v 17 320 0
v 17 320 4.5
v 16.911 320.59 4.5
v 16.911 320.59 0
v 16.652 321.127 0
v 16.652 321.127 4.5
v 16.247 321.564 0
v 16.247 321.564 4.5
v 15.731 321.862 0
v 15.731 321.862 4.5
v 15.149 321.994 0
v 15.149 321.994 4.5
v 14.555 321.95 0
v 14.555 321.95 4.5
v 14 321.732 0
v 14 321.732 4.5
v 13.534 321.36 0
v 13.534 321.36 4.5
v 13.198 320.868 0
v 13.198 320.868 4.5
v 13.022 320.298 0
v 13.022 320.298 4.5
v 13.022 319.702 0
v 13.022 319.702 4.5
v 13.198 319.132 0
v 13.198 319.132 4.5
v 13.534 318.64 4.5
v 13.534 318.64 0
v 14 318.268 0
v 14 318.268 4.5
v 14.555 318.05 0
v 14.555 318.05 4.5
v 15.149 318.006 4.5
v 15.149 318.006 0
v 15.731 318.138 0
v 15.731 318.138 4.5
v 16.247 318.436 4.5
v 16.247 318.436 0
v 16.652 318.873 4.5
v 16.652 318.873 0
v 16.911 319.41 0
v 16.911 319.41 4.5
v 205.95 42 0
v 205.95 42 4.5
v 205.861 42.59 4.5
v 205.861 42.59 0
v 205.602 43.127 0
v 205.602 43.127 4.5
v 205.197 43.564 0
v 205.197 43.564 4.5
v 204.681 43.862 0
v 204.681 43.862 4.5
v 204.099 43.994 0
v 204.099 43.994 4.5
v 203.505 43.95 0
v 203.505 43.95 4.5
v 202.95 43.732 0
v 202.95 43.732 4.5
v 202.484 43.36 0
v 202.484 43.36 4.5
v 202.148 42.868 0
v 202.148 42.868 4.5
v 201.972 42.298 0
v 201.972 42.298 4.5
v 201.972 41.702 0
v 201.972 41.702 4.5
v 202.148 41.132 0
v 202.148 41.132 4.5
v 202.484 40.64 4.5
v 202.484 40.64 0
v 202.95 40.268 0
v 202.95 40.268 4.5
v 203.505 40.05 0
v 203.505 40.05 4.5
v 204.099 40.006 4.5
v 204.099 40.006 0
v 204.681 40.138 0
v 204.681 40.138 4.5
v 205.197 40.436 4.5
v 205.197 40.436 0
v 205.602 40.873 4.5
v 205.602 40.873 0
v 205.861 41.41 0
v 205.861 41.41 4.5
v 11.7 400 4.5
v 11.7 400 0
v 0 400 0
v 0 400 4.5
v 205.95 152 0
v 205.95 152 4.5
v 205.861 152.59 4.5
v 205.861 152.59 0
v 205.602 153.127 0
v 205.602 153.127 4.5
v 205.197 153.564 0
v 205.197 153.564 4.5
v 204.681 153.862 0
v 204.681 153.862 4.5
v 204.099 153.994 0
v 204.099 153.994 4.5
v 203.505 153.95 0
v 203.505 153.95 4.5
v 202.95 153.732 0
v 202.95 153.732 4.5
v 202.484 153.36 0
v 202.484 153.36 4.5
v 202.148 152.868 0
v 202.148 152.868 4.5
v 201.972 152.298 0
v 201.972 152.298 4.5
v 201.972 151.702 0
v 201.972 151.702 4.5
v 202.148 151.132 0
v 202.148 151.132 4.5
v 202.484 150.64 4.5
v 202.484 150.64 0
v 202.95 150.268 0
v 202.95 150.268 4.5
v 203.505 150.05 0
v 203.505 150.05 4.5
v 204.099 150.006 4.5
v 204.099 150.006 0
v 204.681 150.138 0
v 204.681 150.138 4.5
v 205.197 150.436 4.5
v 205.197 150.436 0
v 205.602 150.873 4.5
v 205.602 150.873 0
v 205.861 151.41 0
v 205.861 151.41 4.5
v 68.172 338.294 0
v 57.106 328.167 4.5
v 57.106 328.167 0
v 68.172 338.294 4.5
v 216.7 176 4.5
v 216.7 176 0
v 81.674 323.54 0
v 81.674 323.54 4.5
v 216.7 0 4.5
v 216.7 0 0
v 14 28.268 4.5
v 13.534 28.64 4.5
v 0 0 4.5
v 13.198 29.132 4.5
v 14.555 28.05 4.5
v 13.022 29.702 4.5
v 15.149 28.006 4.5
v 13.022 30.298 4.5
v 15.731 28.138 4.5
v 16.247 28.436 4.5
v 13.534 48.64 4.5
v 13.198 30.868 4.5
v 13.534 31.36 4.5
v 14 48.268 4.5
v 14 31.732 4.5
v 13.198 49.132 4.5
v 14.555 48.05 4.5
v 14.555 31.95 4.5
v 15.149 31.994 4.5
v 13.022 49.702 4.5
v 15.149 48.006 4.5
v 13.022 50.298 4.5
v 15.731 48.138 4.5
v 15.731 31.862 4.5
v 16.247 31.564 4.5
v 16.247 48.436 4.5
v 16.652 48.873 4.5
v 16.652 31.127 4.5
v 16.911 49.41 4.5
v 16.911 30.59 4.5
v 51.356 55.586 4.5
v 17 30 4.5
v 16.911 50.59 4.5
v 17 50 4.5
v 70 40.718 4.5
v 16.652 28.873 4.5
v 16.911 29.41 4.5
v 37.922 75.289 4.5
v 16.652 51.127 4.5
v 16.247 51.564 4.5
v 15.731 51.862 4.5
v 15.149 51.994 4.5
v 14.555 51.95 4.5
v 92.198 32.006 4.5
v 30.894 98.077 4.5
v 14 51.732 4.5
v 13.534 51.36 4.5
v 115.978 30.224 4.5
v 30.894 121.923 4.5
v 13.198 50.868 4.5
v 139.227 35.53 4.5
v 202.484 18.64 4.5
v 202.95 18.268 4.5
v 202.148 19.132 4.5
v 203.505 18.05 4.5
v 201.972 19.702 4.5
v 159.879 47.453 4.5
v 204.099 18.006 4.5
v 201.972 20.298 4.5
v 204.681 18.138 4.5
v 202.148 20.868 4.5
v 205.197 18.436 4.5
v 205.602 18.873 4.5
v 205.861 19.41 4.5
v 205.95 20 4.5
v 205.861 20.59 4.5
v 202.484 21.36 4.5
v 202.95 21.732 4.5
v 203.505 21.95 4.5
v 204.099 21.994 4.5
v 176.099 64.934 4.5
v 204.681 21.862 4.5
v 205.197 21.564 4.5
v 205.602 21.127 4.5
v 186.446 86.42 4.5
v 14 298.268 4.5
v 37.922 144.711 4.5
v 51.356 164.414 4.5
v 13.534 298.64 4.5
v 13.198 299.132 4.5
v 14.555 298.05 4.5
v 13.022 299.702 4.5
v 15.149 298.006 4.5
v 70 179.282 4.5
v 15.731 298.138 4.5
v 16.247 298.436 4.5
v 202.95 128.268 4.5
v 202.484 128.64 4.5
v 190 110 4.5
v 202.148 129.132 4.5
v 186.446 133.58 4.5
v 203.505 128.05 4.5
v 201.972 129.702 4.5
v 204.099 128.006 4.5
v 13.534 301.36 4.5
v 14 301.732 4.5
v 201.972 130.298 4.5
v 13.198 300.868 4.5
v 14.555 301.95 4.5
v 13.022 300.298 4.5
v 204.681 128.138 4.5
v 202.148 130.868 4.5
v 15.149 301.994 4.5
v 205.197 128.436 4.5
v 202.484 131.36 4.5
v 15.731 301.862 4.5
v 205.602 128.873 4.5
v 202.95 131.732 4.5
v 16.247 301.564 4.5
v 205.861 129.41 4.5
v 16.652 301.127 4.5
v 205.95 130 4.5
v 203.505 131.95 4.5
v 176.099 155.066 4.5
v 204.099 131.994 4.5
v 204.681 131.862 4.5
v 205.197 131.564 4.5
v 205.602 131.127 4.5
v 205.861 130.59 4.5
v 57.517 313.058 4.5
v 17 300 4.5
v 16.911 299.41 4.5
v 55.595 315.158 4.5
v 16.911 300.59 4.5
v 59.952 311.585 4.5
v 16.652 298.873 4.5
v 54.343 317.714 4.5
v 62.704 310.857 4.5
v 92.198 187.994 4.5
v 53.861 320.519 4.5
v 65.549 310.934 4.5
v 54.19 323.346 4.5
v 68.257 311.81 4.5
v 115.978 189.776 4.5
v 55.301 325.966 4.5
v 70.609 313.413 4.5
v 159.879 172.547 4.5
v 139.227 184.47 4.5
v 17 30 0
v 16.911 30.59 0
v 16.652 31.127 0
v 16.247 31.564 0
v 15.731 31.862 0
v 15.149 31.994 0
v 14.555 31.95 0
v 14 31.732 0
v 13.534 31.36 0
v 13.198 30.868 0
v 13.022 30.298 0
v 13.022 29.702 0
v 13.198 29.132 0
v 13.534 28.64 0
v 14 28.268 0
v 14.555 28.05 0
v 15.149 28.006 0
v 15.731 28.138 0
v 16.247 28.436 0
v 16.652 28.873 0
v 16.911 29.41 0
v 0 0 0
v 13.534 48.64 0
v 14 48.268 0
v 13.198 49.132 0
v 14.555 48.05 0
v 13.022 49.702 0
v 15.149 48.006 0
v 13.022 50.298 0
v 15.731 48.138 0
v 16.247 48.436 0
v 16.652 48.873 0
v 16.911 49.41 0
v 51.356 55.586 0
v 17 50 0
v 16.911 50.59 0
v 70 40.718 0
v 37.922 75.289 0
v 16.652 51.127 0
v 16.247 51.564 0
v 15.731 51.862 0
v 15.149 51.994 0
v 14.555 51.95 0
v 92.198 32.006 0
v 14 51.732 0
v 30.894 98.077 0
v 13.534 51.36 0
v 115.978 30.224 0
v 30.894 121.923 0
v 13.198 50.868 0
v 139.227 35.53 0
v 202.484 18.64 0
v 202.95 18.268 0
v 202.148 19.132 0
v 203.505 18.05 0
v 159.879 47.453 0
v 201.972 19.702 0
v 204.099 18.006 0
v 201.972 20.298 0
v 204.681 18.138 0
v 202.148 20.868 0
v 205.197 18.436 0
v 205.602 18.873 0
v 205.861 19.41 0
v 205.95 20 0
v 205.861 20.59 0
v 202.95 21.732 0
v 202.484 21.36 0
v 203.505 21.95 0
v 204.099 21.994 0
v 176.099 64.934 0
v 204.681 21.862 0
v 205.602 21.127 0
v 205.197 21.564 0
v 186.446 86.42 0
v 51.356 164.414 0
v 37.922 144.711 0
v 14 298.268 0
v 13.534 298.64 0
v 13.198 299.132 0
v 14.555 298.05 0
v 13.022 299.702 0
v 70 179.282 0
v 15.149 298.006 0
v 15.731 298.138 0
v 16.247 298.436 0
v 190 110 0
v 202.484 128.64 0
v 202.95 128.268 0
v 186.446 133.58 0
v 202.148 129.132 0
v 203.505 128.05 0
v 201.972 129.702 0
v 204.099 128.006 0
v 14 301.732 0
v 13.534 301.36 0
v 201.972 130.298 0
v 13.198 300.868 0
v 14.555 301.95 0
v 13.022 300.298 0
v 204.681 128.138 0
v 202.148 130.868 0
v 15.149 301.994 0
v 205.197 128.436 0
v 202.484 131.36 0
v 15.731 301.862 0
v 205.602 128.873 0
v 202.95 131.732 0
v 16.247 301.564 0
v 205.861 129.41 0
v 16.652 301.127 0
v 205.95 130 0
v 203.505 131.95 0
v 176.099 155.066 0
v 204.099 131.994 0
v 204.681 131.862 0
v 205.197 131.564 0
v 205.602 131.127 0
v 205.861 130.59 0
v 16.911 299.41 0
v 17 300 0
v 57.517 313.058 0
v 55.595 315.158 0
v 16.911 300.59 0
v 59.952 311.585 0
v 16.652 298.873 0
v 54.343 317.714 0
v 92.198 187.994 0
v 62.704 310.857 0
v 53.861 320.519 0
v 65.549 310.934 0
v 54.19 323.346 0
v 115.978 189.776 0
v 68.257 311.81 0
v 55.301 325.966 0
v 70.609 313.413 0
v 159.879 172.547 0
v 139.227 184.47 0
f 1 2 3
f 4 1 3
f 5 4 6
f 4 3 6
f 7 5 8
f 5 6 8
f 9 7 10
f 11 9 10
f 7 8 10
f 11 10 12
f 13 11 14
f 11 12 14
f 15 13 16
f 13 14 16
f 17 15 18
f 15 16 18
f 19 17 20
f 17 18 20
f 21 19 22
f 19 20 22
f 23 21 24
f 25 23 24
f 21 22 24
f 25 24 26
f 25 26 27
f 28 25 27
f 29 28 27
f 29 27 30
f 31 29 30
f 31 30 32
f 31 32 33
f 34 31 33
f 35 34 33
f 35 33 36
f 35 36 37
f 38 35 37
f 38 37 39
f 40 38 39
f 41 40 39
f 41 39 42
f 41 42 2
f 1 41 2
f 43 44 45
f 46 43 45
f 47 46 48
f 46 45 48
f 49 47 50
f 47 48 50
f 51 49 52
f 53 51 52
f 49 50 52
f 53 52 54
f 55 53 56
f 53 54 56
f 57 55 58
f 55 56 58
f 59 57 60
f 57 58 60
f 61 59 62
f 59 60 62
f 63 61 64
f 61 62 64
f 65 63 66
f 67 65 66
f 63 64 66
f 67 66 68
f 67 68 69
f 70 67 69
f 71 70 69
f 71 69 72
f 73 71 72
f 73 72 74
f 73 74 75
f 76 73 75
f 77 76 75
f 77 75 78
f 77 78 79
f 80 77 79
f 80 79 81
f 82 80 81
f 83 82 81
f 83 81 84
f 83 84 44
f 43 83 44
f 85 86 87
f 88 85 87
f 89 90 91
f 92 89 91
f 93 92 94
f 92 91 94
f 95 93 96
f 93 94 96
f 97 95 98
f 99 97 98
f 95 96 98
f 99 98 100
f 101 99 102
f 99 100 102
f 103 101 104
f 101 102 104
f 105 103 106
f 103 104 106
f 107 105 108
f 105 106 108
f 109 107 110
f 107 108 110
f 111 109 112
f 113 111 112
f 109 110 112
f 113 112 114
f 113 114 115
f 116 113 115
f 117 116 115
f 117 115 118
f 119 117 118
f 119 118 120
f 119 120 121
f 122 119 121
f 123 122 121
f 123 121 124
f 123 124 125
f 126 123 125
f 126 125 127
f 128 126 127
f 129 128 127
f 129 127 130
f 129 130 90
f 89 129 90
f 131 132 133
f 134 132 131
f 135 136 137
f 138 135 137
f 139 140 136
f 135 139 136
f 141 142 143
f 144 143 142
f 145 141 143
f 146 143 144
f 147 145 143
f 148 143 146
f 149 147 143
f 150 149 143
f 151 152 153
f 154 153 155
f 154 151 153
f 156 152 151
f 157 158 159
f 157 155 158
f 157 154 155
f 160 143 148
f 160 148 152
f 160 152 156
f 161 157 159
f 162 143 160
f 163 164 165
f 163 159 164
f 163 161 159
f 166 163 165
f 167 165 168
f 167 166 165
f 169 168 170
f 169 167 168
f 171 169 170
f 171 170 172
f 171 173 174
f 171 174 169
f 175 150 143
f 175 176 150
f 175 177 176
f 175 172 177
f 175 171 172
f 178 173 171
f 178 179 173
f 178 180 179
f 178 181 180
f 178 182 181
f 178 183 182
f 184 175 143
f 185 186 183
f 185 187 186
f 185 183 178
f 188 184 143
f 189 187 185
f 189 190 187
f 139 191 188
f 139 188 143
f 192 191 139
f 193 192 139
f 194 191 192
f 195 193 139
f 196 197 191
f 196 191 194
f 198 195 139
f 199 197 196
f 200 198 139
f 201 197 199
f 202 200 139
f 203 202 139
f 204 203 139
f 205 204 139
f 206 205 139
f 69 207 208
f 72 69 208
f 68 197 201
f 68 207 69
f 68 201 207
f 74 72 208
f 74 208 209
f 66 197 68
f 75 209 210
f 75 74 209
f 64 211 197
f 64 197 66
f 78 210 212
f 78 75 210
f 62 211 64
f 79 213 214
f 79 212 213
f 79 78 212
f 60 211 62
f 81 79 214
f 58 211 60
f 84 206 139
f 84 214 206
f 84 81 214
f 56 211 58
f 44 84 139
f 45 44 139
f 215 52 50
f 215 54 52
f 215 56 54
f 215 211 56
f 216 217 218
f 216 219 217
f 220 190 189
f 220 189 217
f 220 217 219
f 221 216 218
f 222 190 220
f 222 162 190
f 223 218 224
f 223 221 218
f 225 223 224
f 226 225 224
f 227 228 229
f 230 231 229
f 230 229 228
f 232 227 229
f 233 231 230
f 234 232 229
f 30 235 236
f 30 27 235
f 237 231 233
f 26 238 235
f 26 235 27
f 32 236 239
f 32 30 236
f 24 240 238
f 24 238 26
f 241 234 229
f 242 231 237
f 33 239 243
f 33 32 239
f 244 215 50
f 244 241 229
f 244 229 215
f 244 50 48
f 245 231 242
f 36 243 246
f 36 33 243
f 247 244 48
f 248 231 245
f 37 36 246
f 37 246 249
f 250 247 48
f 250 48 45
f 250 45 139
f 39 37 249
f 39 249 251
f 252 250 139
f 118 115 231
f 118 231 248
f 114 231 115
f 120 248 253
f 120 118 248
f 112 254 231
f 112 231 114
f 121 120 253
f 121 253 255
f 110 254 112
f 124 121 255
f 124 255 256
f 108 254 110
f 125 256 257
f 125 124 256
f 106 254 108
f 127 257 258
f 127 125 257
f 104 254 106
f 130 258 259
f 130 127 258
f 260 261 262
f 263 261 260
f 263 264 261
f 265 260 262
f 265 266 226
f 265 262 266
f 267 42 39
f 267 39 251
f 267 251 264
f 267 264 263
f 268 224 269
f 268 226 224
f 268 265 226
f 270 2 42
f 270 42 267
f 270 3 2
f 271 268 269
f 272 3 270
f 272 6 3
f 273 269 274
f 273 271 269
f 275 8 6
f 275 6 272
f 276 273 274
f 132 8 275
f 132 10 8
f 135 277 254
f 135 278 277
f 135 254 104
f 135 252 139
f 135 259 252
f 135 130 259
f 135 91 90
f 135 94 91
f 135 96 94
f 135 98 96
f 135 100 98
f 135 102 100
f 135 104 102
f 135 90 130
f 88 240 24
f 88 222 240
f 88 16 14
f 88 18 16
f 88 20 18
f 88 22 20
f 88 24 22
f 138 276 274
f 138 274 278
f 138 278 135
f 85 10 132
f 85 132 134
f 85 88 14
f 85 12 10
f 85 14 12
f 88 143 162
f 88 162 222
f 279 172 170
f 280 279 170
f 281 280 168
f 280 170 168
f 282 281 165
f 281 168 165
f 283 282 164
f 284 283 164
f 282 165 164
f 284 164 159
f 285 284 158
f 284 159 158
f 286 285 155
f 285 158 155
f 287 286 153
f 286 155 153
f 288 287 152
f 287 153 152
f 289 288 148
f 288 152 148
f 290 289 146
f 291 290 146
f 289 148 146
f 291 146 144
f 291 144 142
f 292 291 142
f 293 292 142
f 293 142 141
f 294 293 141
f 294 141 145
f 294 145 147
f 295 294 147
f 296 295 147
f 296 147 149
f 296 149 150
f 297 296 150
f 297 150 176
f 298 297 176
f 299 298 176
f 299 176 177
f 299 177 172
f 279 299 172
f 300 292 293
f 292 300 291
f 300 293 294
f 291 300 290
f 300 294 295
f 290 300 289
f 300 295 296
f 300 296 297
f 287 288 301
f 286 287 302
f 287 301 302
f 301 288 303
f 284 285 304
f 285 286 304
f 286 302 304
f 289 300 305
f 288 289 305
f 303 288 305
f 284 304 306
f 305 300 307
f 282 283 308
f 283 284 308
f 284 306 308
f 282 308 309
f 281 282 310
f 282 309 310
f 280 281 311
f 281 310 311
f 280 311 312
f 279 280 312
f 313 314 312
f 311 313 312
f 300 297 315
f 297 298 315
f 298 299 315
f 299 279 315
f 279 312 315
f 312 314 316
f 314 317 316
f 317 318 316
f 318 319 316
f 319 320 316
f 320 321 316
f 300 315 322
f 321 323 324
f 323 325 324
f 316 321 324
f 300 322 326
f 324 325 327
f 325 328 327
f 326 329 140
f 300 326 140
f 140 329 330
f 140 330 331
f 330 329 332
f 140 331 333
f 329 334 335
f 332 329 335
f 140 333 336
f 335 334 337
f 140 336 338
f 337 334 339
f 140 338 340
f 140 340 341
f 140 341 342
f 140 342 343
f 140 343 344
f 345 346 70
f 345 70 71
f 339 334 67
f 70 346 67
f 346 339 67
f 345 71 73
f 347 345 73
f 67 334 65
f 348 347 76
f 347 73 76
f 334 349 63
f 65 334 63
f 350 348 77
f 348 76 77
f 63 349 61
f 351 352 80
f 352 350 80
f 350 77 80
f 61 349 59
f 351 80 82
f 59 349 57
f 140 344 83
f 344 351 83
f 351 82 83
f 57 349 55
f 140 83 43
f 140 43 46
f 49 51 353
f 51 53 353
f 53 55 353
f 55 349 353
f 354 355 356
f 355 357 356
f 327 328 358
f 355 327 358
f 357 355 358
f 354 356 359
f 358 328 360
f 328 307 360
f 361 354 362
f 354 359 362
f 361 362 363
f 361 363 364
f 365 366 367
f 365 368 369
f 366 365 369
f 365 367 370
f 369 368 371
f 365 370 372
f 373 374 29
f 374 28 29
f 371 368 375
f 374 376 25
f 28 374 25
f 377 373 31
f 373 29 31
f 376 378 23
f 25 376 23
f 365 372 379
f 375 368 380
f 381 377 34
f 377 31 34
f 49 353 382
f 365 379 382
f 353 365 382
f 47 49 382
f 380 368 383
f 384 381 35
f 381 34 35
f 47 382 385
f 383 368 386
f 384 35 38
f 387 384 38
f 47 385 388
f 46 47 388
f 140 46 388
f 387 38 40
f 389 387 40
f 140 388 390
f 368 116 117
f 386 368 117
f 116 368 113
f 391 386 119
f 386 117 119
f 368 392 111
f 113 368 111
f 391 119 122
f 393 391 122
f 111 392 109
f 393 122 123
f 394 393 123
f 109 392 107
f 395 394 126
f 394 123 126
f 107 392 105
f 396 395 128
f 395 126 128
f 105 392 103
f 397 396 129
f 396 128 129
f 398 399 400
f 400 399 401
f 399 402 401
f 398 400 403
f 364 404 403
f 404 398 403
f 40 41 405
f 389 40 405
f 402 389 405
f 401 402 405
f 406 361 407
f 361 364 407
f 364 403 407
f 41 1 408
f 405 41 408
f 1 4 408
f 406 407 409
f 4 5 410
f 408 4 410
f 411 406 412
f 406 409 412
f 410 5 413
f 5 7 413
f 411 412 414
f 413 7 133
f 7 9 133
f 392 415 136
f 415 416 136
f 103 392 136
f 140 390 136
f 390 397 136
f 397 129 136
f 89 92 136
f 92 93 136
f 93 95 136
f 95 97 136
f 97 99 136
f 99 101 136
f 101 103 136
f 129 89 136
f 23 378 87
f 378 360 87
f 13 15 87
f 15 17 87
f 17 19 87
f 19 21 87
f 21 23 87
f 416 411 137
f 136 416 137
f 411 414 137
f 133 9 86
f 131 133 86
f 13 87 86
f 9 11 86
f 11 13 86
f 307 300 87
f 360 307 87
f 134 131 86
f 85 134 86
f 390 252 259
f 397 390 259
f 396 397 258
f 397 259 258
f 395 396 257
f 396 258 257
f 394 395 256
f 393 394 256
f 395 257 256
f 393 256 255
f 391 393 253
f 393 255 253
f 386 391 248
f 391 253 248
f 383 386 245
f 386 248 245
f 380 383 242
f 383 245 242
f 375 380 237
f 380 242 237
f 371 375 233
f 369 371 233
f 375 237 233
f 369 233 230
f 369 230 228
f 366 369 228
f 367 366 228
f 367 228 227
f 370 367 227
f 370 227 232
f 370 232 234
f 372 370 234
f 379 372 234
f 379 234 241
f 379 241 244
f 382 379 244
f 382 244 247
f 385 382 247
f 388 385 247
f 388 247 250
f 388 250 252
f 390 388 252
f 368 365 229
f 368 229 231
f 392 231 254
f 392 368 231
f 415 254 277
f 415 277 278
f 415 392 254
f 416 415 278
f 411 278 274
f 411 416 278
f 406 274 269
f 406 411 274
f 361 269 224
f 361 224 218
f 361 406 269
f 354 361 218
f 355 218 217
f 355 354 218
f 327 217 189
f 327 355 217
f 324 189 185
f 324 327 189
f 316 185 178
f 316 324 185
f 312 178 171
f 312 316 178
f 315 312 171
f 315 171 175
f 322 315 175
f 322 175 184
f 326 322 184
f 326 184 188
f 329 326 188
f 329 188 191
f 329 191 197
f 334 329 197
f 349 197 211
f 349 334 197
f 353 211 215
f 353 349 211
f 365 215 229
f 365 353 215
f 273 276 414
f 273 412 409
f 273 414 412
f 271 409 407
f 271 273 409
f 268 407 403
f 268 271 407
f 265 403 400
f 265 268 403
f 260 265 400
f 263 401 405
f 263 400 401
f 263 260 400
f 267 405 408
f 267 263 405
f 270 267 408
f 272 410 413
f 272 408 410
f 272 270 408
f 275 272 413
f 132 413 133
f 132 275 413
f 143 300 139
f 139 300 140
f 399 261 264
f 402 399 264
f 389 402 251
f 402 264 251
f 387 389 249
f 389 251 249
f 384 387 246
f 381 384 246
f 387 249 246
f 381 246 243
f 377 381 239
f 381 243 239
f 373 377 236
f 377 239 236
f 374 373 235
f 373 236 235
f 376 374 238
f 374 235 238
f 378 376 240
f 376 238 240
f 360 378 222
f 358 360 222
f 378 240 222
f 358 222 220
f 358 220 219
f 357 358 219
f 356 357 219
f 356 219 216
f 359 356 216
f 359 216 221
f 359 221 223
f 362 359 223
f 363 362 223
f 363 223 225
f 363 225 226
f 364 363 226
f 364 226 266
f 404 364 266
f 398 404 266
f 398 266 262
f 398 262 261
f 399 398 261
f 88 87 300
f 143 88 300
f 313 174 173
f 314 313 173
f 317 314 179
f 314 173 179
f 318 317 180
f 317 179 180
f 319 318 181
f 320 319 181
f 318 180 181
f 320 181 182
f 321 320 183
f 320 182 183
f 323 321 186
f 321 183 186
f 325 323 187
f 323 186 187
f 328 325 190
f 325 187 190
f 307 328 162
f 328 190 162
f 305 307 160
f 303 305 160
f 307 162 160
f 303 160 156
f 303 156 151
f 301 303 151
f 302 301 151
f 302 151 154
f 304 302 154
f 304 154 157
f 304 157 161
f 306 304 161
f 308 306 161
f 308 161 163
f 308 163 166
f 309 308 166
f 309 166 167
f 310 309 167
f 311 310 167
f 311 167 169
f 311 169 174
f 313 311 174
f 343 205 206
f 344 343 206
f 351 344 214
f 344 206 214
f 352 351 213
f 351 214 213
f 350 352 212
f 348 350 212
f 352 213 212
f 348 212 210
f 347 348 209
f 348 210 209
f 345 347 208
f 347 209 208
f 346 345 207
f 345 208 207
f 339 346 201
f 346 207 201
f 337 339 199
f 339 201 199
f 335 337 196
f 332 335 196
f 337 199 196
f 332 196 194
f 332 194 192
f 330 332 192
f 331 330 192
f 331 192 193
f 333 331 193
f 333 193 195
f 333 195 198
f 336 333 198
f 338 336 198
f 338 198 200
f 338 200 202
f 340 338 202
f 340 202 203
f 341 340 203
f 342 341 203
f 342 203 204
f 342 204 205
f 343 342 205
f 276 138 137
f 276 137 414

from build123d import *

# Parameters (mm, degrees)
SKETCH_1_R          = 80
EXTRUDE_1_DEPTH     = 4.5
CUT_EXTRUDE_1_REACH = 456.95
SKETCH_2_R          = 2


with BuildPart() as part:
    # 草图1 → 凸台-拉伸1 (new body)
    with BuildSketch(Plane.XY):
        Polygon((0, 0), (216.7, 0), (216.7, 176), (11.7, 400), (0, 400), align=None)
        with Locations((110, 110)):
            Circle(SKETCH_1_R, mode=Mode.SUBTRACT)
    extrude(amount=EXTRUDE_1_DEPTH)

    # 草图2 → 切除-拉伸1 (cut, up to next)
    with BuildSketch(Plane.XY.offset(4.5), mode=Mode.PRIVATE) as cut_extrude_1_sk1:
        with Locations((203.95, 20)):
            Circle(SKETCH_2_R)
    cut_extrude_1_tool1 = extrude(cut_extrude_1_sk1.sketch, amount=-CUT_EXTRUDE_1_REACH, mode=Mode.PRIVATE) & part.part
    # 草图2 → 切除-拉伸1 (cut, up to next)
    with BuildSketch(Plane.XY.offset(4.5), mode=Mode.PRIVATE) as cut_extrude_1_sk2:
        with Locations((203.95, 42)):
            Circle(SKETCH_2_R)
    cut_extrude_1_tool2 = extrude(cut_extrude_1_sk2.sketch, amount=-CUT_EXTRUDE_1_REACH, mode=Mode.PRIVATE) & part.part
    # 草图2 → 切除-拉伸1 (cut, up to next)
    with BuildSketch(Plane.XY.offset(4.5), mode=Mode.PRIVATE) as cut_extrude_1_sk3:
        with Locations((203.95, 130)):
            Circle(SKETCH_2_R)
    cut_extrude_1_tool3 = extrude(cut_extrude_1_sk3.sketch, amount=-CUT_EXTRUDE_1_REACH, mode=Mode.PRIVATE) & part.part
    # 草图2 → 切除-拉伸1 (cut, up to next)
    with BuildSketch(Plane.XY.offset(4.5), mode=Mode.PRIVATE) as cut_extrude_1_sk4:
        with Locations((203.95, 152)):
            Circle(SKETCH_2_R)
    cut_extrude_1_tool4 = extrude(cut_extrude_1_sk4.sketch, amount=-CUT_EXTRUDE_1_REACH, mode=Mode.PRIVATE) & part.part
    # 草图2 → 切除-拉伸1 (cut, up to next)
    with BuildSketch(Plane.XY.offset(4.5), mode=Mode.PRIVATE) as cut_extrude_1_sk5:
        with Locations((15, 30)):
            Circle(SKETCH_2_R)
    cut_extrude_1_tool5 = extrude(cut_extrude_1_sk5.sketch, amount=-CUT_EXTRUDE_1_REACH, mode=Mode.PRIVATE) & part.part
    # 草图2 → 切除-拉伸1 (cut, up to next)
    with BuildSketch(Plane.XY.offset(4.5), mode=Mode.PRIVATE) as cut_extrude_1_sk6:
        with Locations((15, 50)):
            Circle(SKETCH_2_R)
    cut_extrude_1_tool6 = extrude(cut_extrude_1_sk6.sketch, amount=-CUT_EXTRUDE_1_REACH, mode=Mode.PRIVATE) & part.part
    # 草图2 → 切除-拉伸1 (cut, up to next)
    with BuildSketch(Plane.XY.offset(4.5), mode=Mode.PRIVATE) as cut_extrude_1_sk7:
        with Locations((15, 300)):
            Circle(SKETCH_2_R)
    cut_extrude_1_tool7 = extrude(cut_extrude_1_sk7.sketch, amount=-CUT_EXTRUDE_1_REACH, mode=Mode.PRIVATE) & part.part
    # 草图2 → 切除-拉伸1 (cut, up to next)
    with BuildSketch(Plane.XY.offset(4.5), mode=Mode.PRIVATE) as cut_extrude_1_sk8:
        with Locations((15, 320)):
            Circle(SKETCH_2_R)
    cut_extrude_1_tool8 = extrude(cut_extrude_1_sk8.sketch, amount=-CUT_EXTRUDE_1_REACH, mode=Mode.PRIVATE) & part.part
    # 草图2 → 切除-拉伸1 (cut, up to next)
    with BuildSketch(Plane.XY.offset(4.5), mode=Mode.PRIVATE) as cut_extrude_1_sk9:
        with BuildLine():
            Line((57.106354887, 328.167238391), (68.171865568, 338.294156648))
            Line((68.171865568, 338.294156648), (81.674423243, 323.540142407))
            Line((81.674423243, 323.540142407), (70.608912563, 313.41322415))
            ThreePointArc((70.608912563, 313.41322415), (56.480626605, 314.038952433), (57.106354887, 328.167238391))
        make_face()
    cut_extrude_1_tool9 = extrude(cut_extrude_1_sk9.sketch, amount=-CUT_EXTRUDE_1_REACH, mode=Mode.PRIVATE) & part.part
    add(cut_extrude_1_tool1.solids().sort_by_distance((203.95, 20, 4.5))[0], mode=Mode.SUBTRACT)
    add(cut_extrude_1_tool2.solids().sort_by_distance((203.95, 42, 4.5))[0], mode=Mode.SUBTRACT)
    add(cut_extrude_1_tool3.solids().sort_by_distance((203.95, 130, 4.5))[0], mode=Mode.SUBTRACT)
    add(cut_extrude_1_tool4.solids().sort_by_distance((203.95, 152, 4.5))[0], mode=Mode.SUBTRACT)
    add(cut_extrude_1_tool5.solids().sort_by_distance((15, 30, 4.5))[0], mode=Mode.SUBTRACT)
    add(cut_extrude_1_tool6.solids().sort_by_distance((15, 50, 4.5))[0], mode=Mode.SUBTRACT)
    add(cut_extrude_1_tool7.solids().sort_by_distance((15, 300, 4.5))[0], mode=Mode.SUBTRACT)
    add(cut_extrude_1_tool8.solids().sort_by_distance((15, 320, 4.5))[0], mode=Mode.SUBTRACT)
    add(cut_extrude_1_tool9.solids().sort_by_distance((66.413044, 323.128888, 4.5))[0], mode=Mode.SUBTRACT)


solid = part.part
